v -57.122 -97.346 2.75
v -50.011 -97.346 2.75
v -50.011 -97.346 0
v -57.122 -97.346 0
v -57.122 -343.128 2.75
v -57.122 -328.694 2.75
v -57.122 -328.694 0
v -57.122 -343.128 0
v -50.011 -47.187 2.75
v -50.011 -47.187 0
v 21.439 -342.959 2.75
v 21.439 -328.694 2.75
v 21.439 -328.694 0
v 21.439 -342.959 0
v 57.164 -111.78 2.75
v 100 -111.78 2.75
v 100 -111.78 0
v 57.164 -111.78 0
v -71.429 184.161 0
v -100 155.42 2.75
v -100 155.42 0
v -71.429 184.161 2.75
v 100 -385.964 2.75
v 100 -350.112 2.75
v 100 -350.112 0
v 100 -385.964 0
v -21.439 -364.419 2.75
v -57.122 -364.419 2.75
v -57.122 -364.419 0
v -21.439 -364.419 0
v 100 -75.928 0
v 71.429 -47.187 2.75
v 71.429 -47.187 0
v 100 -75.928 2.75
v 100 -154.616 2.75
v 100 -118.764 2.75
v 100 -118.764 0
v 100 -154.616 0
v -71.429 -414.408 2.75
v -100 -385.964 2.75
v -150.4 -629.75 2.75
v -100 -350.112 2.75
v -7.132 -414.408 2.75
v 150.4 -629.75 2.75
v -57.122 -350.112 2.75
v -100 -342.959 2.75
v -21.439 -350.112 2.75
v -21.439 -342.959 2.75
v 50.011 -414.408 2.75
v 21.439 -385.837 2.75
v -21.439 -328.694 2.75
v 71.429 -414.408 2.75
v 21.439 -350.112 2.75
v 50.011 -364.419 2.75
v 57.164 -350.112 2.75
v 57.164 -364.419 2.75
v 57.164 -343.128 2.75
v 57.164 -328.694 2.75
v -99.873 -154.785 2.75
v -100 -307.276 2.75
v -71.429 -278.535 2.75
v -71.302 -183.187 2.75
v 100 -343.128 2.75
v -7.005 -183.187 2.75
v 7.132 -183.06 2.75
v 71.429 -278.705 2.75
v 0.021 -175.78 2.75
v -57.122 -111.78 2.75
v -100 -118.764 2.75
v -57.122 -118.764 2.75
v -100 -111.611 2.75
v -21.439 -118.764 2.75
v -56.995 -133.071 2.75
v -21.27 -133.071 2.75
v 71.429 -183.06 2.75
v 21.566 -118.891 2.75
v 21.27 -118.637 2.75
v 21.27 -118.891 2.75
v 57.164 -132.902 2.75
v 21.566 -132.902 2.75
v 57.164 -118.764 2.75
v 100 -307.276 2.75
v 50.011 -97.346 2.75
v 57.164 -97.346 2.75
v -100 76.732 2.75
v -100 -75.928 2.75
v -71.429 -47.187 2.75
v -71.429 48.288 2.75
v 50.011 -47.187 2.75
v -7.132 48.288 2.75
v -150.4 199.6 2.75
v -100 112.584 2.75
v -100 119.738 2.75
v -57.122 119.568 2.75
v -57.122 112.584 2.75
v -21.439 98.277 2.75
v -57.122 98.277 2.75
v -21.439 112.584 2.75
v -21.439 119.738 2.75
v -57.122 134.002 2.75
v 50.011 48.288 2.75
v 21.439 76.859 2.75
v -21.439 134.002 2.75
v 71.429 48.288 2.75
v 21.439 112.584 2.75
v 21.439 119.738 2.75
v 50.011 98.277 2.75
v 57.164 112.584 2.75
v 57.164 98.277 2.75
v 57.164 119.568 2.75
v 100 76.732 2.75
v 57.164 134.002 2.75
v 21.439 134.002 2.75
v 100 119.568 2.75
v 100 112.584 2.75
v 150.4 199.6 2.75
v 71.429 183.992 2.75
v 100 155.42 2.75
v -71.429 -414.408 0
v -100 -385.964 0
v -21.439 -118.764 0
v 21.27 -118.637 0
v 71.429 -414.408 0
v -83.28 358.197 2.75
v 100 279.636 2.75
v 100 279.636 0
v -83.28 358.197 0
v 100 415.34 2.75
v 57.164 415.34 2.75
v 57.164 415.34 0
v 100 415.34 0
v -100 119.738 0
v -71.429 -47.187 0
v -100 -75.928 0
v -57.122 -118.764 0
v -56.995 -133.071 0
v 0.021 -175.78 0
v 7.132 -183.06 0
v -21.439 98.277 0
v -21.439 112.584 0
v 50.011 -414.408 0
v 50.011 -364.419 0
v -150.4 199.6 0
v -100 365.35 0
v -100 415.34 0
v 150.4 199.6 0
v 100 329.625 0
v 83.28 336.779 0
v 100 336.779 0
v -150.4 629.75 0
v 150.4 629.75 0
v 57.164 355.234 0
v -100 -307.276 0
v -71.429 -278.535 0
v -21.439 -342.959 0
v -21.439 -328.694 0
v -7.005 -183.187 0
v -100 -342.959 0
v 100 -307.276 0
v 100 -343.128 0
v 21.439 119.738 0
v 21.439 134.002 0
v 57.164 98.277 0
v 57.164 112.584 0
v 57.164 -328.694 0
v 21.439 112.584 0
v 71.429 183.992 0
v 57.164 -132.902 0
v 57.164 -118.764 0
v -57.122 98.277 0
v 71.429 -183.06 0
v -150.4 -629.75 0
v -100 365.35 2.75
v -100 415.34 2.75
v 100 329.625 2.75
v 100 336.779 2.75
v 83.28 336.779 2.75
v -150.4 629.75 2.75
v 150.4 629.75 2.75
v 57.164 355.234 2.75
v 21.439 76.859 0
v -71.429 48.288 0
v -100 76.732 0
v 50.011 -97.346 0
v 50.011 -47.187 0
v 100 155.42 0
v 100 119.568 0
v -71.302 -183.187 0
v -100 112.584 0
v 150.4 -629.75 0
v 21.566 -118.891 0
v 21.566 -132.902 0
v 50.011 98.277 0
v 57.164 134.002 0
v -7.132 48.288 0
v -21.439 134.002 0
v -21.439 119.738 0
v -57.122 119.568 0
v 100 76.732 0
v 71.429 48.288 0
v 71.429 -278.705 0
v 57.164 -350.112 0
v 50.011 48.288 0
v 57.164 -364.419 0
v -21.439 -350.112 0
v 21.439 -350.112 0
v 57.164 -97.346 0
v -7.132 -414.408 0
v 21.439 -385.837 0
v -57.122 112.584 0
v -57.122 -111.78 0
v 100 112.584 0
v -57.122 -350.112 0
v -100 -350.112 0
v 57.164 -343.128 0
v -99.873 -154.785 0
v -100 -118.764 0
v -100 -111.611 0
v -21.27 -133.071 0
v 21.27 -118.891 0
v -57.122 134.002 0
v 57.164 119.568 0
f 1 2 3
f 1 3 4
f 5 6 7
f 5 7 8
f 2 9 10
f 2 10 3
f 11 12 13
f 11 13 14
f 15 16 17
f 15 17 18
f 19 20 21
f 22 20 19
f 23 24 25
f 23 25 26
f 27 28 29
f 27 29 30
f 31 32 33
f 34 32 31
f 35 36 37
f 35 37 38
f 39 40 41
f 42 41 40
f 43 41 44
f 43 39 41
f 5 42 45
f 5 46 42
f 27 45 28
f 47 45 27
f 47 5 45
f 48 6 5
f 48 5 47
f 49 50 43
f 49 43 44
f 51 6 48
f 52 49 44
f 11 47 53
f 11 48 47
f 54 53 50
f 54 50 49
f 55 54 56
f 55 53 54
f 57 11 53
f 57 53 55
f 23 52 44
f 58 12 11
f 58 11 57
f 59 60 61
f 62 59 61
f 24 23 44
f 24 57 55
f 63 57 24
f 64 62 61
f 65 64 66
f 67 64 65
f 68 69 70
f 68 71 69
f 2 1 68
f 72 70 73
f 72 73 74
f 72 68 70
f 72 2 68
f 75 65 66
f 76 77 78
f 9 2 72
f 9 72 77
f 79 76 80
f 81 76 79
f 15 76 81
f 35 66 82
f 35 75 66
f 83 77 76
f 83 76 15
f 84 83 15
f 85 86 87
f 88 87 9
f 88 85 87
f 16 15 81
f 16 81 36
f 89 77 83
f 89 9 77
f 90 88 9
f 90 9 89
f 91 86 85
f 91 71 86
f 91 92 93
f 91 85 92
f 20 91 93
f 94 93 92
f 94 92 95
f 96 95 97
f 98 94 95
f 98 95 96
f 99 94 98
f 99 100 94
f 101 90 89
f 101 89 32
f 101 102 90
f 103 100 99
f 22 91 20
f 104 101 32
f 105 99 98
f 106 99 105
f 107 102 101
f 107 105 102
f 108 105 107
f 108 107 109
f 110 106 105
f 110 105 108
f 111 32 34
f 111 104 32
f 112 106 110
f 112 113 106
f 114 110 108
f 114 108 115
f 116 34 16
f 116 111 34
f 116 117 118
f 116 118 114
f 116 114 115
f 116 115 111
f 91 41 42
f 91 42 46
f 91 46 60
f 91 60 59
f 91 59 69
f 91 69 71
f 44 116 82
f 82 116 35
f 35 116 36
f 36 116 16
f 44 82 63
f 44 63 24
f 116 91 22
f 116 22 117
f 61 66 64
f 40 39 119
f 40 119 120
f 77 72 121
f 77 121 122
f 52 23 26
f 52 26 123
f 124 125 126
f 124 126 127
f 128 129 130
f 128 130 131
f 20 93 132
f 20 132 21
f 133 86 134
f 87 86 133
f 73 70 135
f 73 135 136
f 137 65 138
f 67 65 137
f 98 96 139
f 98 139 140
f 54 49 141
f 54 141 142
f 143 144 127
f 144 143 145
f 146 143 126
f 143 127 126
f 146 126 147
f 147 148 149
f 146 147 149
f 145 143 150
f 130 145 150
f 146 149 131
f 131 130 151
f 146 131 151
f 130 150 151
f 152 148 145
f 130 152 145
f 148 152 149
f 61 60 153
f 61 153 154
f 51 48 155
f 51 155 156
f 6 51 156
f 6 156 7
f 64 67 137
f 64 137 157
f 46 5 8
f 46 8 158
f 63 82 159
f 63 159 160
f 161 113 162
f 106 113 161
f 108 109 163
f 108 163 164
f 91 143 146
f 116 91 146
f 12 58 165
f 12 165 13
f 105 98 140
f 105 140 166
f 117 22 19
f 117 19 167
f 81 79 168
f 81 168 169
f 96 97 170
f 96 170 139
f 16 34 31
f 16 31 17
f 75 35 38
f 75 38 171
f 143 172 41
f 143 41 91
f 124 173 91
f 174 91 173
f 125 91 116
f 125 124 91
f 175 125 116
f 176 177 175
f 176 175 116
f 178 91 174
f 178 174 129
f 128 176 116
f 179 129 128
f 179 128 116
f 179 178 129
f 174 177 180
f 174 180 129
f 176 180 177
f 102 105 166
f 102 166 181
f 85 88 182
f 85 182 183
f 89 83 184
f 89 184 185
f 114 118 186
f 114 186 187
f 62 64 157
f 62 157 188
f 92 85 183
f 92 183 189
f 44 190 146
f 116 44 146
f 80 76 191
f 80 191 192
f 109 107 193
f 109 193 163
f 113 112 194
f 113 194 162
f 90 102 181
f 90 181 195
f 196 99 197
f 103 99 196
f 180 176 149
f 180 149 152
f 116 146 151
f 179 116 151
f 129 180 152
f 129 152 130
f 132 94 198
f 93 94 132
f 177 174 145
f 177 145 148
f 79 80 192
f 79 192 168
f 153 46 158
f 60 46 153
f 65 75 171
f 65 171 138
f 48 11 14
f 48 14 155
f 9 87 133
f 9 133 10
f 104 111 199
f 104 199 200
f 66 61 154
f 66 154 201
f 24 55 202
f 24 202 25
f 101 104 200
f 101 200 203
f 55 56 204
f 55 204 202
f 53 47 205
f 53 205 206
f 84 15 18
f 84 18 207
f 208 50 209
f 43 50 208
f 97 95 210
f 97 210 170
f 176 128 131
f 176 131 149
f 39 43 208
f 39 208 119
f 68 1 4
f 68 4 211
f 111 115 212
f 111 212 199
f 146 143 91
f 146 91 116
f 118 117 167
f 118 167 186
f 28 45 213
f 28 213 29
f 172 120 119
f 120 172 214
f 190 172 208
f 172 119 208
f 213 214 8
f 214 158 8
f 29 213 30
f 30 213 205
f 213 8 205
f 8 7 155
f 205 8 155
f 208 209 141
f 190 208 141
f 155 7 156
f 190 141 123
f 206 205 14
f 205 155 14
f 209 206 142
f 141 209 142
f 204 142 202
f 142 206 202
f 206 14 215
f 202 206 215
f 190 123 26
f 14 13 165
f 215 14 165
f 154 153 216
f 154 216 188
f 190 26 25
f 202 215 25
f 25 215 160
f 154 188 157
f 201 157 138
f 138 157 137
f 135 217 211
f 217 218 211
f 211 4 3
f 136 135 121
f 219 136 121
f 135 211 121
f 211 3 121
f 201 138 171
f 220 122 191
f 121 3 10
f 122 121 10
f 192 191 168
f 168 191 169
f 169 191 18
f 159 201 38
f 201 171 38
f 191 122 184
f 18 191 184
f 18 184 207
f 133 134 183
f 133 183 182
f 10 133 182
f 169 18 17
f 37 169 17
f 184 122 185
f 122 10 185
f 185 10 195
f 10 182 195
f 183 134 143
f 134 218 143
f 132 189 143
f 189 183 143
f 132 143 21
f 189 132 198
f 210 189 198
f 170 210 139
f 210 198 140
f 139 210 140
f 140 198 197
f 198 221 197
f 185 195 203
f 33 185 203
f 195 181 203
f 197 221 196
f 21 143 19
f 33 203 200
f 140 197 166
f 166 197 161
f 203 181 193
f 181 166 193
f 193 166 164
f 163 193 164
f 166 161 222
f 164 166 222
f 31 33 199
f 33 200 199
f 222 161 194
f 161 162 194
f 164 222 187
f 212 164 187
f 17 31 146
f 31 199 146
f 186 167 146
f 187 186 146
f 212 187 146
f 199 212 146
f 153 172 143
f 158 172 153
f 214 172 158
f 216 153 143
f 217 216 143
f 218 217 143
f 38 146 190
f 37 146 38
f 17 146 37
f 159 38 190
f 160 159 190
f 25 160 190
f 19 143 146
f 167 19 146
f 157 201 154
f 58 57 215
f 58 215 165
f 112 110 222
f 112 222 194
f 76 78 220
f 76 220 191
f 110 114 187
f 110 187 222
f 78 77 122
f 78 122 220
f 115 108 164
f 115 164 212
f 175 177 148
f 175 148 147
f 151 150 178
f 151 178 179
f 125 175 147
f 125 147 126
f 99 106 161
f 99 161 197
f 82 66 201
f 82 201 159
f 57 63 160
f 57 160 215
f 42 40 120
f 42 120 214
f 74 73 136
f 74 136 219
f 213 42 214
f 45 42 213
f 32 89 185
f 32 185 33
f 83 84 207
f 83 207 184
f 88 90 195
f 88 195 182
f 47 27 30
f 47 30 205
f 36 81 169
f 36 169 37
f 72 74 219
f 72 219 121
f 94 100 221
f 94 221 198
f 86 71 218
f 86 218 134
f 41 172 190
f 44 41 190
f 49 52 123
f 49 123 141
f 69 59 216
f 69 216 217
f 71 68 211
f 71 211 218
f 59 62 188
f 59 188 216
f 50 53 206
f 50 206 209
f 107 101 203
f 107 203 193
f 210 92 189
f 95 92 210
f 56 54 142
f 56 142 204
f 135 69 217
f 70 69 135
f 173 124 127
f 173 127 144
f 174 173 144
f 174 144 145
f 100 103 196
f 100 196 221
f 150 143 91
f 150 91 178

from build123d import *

# Parameters (mm, degrees)
SKETCH_1_W                     = 300.8
SKETCH_1_H                     = 1259.5
EXTRUDE_1_DEPTH                = 2.75
CUT_EXTRUDE_1_DEPTH            = 10
SPLIT_BODIES_5_SURFACE_1_BACK  = 1295.924
SPLIT_BODIES_5_SURFACE_1_DEPTH = 2591.848
SPLIT_BODIES_5_SURFACE_2_BACK  = 1295.924
SPLIT_BODIES_5_SURFACE_2_DEPTH = 2591.848


with BuildPart() as part:
    # 草圖1 → 填料-伸長1 (new body)
    with BuildSketch(Plane.XY):
        Rectangle(SKETCH_1_W, SKETCH_1_H)
    extrude(amount=EXTRUDE_1_DEPTH)

    # 草圖2 → 除料-伸長1 (cut)
    with BuildSketch(Plane.XY.offset(2.75)):
        Polygon((100, 329.625396825), (100, 279.635978836), (-83.28042328, 358.196825397), (-100, 365.35026455), (-100, 415.33968254), (83.28042328, 336.778835979), align=None)
        Polygon((57.164021164, 355.233862434), (57.164021164, 415.33968254), (100, 415.33968254), (100, 336.778835979), align=None)
        Polygon((50.010582011, 98.277248677), (57.164021164, 98.277248677), (57.164021164, 112.584126984), (100, 112.584126984), (100, 76.732275132), (71.428571429, 48.287830688), (50.010582011, 48.287830688), align=None)
        Polygon((-71.428571429, 48.287830688), (-100, 76.732275132), (-100, 112.584126984), (-57.121693122, 112.584126984), (-57.121693122, 98.277248677), (-21.439153439, 98.277248677), (-21.439153439, 112.584126984), (21.439153439, 112.584126984), (21.439153439, 76.859259259), (-7.132275132, 48.287830688), align=None)
        Polygon((-21.439153439, 134.002116402), (-57.121693122, 134.002116402), (-57.121693122, 119.568253968), (-100, 119.737566138), (-100, 155.42010582), (-71.428571429, 184.160846561), (71.428571429, 183.991534392), (100, 155.42010582), (100, 119.568253968), (57.164021164, 119.568253968), (57.164021164, 134.002116402), (21.439153439, 134.002116402), (21.439153439, 119.737566138), (-21.439153439, 119.737566138), align=None)
        Polygon((21.566137566, -132.901587302), (57.164021164, -132.901587302), (57.164021164, -118.764021164), (100, -118.764021164), (100, -154.615873016), (71.428571429, -183.06031746), (7.132275132, -183.06031746), (0.021164021, -175.77989418), (-7.005291005, -183.187301587), (-71.301587302, -183.187301587), (-99.873015873, -154.785185185), (-100, -118.764021164), (-57.121693122, -118.764021164), (-56.994708995, -133.070899471), (-21.26984127, -133.070899471), (-21.439153439, -118.764021164), (21.26984127, -118.637037037), (21.26984127, -118.891005291), (21.566137566, -118.891005291), align=None)
        Polygon((50.010582011, -47.187301587), (71.428571429, -47.187301587), (100, -75.928042328), (100, -111.77989418), (57.164021164, -111.77989418), (57.164021164, -97.346031746), (50.010582011, -97.346031746), align=None)
        Polygon((-50.010582011, -97.346031746), (-57.121693122, -97.346031746), (-57.121693122, -111.77989418), (-100, -111.610582011), (-100, -75.928042328), (-71.428571429, -47.187301587), (-50.010582011, -47.187301587), align=None)
        Polygon((50.010582011, -364.419047619), (57.164021164, -364.419047619), (57.164021164, -350.112169312), (100, -350.112169312), (100, -385.964021164), (71.428571429, -414.408465608), (50.010582011, -414.408465608), align=None)
        Polygon((-71.428571429, -414.408465608), (-100, -385.964021164), (-100, -350.112169312), (-57.121693122, -350.112169312), (-57.121693122, -364.419047619), (-21.439153439, -364.419047619), (-21.439153439, -350.112169312), (21.439153439, -350.112169312), (21.439153439, -385.837037037), (-7.132275132, -414.408465608), align=None)
        Polygon((-21.439153439, -328.694179894), (-57.121693122, -328.694179894), (-57.121693122, -343.128042328), (-100, -342.958730159), (-100, -307.276190476), (-71.428571429, -278.535449735), (71.428571429, -278.704761905), (100, -307.276190476), (100, -343.128042328), (57.164021164, -343.128042328), (57.164021164, -328.694179894), (21.439153439, -328.694179894), (21.439153439, -342.958730159), (-21.439153439, -342.958730159), align=None)
    extrude(amount=-CUT_EXTRUDE_1_DEPTH, mode=Mode.SUBTRACT)


with BuildPart() as body_2:
    # Split Bodies 5: the piece behind the surface
    add(part.part)
    # Split Bodies 5 surface: a surface, the sketch's curves swept straight by 2591.848 mm
    with BuildLine(Plane.XY.offset(2.75).offset(-SPLIT_BODIES_5_SURFACE_1_BACK), mode=Mode.PRIVATE) as split_bodies_5_surface_1_path:
        Line((-150.4, 199.6), (150.4, 199.6))
    split_bodies_5_surface_1 = Shell.extrude(split_bodies_5_surface_1_path.wire(), (0 * SPLIT_BODIES_5_SURFACE_1_DEPTH, 0 * SPLIT_BODIES_5_SURFACE_1_DEPTH, 1 * SPLIT_BODIES_5_SURFACE_1_DEPTH))
    split(bisect_by=split_bodies_5_surface_1, keep=Keep.BOTTOM)


with BuildPart() as part_1:
    add(part.part)

    # Split Bodies 5: split by a surface, the side it looks to stays
    # Split Bodies 5 surface: a surface, the sketch's curves swept straight by 2591.848 mm
    with BuildLine(Plane.XY.offset(2.75).offset(-SPLIT_BODIES_5_SURFACE_2_BACK), mode=Mode.PRIVATE) as split_bodies_5_surface_2_path:
        Line((-150.4, 199.6), (150.4, 199.6))
    split_bodies_5_surface_2 = Shell.extrude(split_bodies_5_surface_2_path.wire(), (0 * SPLIT_BODIES_5_SURFACE_2_DEPTH, 0 * SPLIT_BODIES_5_SURFACE_2_DEPTH, 1 * SPLIT_BODIES_5_SURFACE_2_DEPTH))
    split(bisect_by=split_bodies_5_surface_2, keep=Keep.TOP)


solid = Compound([body_2.part, part_1.part])
